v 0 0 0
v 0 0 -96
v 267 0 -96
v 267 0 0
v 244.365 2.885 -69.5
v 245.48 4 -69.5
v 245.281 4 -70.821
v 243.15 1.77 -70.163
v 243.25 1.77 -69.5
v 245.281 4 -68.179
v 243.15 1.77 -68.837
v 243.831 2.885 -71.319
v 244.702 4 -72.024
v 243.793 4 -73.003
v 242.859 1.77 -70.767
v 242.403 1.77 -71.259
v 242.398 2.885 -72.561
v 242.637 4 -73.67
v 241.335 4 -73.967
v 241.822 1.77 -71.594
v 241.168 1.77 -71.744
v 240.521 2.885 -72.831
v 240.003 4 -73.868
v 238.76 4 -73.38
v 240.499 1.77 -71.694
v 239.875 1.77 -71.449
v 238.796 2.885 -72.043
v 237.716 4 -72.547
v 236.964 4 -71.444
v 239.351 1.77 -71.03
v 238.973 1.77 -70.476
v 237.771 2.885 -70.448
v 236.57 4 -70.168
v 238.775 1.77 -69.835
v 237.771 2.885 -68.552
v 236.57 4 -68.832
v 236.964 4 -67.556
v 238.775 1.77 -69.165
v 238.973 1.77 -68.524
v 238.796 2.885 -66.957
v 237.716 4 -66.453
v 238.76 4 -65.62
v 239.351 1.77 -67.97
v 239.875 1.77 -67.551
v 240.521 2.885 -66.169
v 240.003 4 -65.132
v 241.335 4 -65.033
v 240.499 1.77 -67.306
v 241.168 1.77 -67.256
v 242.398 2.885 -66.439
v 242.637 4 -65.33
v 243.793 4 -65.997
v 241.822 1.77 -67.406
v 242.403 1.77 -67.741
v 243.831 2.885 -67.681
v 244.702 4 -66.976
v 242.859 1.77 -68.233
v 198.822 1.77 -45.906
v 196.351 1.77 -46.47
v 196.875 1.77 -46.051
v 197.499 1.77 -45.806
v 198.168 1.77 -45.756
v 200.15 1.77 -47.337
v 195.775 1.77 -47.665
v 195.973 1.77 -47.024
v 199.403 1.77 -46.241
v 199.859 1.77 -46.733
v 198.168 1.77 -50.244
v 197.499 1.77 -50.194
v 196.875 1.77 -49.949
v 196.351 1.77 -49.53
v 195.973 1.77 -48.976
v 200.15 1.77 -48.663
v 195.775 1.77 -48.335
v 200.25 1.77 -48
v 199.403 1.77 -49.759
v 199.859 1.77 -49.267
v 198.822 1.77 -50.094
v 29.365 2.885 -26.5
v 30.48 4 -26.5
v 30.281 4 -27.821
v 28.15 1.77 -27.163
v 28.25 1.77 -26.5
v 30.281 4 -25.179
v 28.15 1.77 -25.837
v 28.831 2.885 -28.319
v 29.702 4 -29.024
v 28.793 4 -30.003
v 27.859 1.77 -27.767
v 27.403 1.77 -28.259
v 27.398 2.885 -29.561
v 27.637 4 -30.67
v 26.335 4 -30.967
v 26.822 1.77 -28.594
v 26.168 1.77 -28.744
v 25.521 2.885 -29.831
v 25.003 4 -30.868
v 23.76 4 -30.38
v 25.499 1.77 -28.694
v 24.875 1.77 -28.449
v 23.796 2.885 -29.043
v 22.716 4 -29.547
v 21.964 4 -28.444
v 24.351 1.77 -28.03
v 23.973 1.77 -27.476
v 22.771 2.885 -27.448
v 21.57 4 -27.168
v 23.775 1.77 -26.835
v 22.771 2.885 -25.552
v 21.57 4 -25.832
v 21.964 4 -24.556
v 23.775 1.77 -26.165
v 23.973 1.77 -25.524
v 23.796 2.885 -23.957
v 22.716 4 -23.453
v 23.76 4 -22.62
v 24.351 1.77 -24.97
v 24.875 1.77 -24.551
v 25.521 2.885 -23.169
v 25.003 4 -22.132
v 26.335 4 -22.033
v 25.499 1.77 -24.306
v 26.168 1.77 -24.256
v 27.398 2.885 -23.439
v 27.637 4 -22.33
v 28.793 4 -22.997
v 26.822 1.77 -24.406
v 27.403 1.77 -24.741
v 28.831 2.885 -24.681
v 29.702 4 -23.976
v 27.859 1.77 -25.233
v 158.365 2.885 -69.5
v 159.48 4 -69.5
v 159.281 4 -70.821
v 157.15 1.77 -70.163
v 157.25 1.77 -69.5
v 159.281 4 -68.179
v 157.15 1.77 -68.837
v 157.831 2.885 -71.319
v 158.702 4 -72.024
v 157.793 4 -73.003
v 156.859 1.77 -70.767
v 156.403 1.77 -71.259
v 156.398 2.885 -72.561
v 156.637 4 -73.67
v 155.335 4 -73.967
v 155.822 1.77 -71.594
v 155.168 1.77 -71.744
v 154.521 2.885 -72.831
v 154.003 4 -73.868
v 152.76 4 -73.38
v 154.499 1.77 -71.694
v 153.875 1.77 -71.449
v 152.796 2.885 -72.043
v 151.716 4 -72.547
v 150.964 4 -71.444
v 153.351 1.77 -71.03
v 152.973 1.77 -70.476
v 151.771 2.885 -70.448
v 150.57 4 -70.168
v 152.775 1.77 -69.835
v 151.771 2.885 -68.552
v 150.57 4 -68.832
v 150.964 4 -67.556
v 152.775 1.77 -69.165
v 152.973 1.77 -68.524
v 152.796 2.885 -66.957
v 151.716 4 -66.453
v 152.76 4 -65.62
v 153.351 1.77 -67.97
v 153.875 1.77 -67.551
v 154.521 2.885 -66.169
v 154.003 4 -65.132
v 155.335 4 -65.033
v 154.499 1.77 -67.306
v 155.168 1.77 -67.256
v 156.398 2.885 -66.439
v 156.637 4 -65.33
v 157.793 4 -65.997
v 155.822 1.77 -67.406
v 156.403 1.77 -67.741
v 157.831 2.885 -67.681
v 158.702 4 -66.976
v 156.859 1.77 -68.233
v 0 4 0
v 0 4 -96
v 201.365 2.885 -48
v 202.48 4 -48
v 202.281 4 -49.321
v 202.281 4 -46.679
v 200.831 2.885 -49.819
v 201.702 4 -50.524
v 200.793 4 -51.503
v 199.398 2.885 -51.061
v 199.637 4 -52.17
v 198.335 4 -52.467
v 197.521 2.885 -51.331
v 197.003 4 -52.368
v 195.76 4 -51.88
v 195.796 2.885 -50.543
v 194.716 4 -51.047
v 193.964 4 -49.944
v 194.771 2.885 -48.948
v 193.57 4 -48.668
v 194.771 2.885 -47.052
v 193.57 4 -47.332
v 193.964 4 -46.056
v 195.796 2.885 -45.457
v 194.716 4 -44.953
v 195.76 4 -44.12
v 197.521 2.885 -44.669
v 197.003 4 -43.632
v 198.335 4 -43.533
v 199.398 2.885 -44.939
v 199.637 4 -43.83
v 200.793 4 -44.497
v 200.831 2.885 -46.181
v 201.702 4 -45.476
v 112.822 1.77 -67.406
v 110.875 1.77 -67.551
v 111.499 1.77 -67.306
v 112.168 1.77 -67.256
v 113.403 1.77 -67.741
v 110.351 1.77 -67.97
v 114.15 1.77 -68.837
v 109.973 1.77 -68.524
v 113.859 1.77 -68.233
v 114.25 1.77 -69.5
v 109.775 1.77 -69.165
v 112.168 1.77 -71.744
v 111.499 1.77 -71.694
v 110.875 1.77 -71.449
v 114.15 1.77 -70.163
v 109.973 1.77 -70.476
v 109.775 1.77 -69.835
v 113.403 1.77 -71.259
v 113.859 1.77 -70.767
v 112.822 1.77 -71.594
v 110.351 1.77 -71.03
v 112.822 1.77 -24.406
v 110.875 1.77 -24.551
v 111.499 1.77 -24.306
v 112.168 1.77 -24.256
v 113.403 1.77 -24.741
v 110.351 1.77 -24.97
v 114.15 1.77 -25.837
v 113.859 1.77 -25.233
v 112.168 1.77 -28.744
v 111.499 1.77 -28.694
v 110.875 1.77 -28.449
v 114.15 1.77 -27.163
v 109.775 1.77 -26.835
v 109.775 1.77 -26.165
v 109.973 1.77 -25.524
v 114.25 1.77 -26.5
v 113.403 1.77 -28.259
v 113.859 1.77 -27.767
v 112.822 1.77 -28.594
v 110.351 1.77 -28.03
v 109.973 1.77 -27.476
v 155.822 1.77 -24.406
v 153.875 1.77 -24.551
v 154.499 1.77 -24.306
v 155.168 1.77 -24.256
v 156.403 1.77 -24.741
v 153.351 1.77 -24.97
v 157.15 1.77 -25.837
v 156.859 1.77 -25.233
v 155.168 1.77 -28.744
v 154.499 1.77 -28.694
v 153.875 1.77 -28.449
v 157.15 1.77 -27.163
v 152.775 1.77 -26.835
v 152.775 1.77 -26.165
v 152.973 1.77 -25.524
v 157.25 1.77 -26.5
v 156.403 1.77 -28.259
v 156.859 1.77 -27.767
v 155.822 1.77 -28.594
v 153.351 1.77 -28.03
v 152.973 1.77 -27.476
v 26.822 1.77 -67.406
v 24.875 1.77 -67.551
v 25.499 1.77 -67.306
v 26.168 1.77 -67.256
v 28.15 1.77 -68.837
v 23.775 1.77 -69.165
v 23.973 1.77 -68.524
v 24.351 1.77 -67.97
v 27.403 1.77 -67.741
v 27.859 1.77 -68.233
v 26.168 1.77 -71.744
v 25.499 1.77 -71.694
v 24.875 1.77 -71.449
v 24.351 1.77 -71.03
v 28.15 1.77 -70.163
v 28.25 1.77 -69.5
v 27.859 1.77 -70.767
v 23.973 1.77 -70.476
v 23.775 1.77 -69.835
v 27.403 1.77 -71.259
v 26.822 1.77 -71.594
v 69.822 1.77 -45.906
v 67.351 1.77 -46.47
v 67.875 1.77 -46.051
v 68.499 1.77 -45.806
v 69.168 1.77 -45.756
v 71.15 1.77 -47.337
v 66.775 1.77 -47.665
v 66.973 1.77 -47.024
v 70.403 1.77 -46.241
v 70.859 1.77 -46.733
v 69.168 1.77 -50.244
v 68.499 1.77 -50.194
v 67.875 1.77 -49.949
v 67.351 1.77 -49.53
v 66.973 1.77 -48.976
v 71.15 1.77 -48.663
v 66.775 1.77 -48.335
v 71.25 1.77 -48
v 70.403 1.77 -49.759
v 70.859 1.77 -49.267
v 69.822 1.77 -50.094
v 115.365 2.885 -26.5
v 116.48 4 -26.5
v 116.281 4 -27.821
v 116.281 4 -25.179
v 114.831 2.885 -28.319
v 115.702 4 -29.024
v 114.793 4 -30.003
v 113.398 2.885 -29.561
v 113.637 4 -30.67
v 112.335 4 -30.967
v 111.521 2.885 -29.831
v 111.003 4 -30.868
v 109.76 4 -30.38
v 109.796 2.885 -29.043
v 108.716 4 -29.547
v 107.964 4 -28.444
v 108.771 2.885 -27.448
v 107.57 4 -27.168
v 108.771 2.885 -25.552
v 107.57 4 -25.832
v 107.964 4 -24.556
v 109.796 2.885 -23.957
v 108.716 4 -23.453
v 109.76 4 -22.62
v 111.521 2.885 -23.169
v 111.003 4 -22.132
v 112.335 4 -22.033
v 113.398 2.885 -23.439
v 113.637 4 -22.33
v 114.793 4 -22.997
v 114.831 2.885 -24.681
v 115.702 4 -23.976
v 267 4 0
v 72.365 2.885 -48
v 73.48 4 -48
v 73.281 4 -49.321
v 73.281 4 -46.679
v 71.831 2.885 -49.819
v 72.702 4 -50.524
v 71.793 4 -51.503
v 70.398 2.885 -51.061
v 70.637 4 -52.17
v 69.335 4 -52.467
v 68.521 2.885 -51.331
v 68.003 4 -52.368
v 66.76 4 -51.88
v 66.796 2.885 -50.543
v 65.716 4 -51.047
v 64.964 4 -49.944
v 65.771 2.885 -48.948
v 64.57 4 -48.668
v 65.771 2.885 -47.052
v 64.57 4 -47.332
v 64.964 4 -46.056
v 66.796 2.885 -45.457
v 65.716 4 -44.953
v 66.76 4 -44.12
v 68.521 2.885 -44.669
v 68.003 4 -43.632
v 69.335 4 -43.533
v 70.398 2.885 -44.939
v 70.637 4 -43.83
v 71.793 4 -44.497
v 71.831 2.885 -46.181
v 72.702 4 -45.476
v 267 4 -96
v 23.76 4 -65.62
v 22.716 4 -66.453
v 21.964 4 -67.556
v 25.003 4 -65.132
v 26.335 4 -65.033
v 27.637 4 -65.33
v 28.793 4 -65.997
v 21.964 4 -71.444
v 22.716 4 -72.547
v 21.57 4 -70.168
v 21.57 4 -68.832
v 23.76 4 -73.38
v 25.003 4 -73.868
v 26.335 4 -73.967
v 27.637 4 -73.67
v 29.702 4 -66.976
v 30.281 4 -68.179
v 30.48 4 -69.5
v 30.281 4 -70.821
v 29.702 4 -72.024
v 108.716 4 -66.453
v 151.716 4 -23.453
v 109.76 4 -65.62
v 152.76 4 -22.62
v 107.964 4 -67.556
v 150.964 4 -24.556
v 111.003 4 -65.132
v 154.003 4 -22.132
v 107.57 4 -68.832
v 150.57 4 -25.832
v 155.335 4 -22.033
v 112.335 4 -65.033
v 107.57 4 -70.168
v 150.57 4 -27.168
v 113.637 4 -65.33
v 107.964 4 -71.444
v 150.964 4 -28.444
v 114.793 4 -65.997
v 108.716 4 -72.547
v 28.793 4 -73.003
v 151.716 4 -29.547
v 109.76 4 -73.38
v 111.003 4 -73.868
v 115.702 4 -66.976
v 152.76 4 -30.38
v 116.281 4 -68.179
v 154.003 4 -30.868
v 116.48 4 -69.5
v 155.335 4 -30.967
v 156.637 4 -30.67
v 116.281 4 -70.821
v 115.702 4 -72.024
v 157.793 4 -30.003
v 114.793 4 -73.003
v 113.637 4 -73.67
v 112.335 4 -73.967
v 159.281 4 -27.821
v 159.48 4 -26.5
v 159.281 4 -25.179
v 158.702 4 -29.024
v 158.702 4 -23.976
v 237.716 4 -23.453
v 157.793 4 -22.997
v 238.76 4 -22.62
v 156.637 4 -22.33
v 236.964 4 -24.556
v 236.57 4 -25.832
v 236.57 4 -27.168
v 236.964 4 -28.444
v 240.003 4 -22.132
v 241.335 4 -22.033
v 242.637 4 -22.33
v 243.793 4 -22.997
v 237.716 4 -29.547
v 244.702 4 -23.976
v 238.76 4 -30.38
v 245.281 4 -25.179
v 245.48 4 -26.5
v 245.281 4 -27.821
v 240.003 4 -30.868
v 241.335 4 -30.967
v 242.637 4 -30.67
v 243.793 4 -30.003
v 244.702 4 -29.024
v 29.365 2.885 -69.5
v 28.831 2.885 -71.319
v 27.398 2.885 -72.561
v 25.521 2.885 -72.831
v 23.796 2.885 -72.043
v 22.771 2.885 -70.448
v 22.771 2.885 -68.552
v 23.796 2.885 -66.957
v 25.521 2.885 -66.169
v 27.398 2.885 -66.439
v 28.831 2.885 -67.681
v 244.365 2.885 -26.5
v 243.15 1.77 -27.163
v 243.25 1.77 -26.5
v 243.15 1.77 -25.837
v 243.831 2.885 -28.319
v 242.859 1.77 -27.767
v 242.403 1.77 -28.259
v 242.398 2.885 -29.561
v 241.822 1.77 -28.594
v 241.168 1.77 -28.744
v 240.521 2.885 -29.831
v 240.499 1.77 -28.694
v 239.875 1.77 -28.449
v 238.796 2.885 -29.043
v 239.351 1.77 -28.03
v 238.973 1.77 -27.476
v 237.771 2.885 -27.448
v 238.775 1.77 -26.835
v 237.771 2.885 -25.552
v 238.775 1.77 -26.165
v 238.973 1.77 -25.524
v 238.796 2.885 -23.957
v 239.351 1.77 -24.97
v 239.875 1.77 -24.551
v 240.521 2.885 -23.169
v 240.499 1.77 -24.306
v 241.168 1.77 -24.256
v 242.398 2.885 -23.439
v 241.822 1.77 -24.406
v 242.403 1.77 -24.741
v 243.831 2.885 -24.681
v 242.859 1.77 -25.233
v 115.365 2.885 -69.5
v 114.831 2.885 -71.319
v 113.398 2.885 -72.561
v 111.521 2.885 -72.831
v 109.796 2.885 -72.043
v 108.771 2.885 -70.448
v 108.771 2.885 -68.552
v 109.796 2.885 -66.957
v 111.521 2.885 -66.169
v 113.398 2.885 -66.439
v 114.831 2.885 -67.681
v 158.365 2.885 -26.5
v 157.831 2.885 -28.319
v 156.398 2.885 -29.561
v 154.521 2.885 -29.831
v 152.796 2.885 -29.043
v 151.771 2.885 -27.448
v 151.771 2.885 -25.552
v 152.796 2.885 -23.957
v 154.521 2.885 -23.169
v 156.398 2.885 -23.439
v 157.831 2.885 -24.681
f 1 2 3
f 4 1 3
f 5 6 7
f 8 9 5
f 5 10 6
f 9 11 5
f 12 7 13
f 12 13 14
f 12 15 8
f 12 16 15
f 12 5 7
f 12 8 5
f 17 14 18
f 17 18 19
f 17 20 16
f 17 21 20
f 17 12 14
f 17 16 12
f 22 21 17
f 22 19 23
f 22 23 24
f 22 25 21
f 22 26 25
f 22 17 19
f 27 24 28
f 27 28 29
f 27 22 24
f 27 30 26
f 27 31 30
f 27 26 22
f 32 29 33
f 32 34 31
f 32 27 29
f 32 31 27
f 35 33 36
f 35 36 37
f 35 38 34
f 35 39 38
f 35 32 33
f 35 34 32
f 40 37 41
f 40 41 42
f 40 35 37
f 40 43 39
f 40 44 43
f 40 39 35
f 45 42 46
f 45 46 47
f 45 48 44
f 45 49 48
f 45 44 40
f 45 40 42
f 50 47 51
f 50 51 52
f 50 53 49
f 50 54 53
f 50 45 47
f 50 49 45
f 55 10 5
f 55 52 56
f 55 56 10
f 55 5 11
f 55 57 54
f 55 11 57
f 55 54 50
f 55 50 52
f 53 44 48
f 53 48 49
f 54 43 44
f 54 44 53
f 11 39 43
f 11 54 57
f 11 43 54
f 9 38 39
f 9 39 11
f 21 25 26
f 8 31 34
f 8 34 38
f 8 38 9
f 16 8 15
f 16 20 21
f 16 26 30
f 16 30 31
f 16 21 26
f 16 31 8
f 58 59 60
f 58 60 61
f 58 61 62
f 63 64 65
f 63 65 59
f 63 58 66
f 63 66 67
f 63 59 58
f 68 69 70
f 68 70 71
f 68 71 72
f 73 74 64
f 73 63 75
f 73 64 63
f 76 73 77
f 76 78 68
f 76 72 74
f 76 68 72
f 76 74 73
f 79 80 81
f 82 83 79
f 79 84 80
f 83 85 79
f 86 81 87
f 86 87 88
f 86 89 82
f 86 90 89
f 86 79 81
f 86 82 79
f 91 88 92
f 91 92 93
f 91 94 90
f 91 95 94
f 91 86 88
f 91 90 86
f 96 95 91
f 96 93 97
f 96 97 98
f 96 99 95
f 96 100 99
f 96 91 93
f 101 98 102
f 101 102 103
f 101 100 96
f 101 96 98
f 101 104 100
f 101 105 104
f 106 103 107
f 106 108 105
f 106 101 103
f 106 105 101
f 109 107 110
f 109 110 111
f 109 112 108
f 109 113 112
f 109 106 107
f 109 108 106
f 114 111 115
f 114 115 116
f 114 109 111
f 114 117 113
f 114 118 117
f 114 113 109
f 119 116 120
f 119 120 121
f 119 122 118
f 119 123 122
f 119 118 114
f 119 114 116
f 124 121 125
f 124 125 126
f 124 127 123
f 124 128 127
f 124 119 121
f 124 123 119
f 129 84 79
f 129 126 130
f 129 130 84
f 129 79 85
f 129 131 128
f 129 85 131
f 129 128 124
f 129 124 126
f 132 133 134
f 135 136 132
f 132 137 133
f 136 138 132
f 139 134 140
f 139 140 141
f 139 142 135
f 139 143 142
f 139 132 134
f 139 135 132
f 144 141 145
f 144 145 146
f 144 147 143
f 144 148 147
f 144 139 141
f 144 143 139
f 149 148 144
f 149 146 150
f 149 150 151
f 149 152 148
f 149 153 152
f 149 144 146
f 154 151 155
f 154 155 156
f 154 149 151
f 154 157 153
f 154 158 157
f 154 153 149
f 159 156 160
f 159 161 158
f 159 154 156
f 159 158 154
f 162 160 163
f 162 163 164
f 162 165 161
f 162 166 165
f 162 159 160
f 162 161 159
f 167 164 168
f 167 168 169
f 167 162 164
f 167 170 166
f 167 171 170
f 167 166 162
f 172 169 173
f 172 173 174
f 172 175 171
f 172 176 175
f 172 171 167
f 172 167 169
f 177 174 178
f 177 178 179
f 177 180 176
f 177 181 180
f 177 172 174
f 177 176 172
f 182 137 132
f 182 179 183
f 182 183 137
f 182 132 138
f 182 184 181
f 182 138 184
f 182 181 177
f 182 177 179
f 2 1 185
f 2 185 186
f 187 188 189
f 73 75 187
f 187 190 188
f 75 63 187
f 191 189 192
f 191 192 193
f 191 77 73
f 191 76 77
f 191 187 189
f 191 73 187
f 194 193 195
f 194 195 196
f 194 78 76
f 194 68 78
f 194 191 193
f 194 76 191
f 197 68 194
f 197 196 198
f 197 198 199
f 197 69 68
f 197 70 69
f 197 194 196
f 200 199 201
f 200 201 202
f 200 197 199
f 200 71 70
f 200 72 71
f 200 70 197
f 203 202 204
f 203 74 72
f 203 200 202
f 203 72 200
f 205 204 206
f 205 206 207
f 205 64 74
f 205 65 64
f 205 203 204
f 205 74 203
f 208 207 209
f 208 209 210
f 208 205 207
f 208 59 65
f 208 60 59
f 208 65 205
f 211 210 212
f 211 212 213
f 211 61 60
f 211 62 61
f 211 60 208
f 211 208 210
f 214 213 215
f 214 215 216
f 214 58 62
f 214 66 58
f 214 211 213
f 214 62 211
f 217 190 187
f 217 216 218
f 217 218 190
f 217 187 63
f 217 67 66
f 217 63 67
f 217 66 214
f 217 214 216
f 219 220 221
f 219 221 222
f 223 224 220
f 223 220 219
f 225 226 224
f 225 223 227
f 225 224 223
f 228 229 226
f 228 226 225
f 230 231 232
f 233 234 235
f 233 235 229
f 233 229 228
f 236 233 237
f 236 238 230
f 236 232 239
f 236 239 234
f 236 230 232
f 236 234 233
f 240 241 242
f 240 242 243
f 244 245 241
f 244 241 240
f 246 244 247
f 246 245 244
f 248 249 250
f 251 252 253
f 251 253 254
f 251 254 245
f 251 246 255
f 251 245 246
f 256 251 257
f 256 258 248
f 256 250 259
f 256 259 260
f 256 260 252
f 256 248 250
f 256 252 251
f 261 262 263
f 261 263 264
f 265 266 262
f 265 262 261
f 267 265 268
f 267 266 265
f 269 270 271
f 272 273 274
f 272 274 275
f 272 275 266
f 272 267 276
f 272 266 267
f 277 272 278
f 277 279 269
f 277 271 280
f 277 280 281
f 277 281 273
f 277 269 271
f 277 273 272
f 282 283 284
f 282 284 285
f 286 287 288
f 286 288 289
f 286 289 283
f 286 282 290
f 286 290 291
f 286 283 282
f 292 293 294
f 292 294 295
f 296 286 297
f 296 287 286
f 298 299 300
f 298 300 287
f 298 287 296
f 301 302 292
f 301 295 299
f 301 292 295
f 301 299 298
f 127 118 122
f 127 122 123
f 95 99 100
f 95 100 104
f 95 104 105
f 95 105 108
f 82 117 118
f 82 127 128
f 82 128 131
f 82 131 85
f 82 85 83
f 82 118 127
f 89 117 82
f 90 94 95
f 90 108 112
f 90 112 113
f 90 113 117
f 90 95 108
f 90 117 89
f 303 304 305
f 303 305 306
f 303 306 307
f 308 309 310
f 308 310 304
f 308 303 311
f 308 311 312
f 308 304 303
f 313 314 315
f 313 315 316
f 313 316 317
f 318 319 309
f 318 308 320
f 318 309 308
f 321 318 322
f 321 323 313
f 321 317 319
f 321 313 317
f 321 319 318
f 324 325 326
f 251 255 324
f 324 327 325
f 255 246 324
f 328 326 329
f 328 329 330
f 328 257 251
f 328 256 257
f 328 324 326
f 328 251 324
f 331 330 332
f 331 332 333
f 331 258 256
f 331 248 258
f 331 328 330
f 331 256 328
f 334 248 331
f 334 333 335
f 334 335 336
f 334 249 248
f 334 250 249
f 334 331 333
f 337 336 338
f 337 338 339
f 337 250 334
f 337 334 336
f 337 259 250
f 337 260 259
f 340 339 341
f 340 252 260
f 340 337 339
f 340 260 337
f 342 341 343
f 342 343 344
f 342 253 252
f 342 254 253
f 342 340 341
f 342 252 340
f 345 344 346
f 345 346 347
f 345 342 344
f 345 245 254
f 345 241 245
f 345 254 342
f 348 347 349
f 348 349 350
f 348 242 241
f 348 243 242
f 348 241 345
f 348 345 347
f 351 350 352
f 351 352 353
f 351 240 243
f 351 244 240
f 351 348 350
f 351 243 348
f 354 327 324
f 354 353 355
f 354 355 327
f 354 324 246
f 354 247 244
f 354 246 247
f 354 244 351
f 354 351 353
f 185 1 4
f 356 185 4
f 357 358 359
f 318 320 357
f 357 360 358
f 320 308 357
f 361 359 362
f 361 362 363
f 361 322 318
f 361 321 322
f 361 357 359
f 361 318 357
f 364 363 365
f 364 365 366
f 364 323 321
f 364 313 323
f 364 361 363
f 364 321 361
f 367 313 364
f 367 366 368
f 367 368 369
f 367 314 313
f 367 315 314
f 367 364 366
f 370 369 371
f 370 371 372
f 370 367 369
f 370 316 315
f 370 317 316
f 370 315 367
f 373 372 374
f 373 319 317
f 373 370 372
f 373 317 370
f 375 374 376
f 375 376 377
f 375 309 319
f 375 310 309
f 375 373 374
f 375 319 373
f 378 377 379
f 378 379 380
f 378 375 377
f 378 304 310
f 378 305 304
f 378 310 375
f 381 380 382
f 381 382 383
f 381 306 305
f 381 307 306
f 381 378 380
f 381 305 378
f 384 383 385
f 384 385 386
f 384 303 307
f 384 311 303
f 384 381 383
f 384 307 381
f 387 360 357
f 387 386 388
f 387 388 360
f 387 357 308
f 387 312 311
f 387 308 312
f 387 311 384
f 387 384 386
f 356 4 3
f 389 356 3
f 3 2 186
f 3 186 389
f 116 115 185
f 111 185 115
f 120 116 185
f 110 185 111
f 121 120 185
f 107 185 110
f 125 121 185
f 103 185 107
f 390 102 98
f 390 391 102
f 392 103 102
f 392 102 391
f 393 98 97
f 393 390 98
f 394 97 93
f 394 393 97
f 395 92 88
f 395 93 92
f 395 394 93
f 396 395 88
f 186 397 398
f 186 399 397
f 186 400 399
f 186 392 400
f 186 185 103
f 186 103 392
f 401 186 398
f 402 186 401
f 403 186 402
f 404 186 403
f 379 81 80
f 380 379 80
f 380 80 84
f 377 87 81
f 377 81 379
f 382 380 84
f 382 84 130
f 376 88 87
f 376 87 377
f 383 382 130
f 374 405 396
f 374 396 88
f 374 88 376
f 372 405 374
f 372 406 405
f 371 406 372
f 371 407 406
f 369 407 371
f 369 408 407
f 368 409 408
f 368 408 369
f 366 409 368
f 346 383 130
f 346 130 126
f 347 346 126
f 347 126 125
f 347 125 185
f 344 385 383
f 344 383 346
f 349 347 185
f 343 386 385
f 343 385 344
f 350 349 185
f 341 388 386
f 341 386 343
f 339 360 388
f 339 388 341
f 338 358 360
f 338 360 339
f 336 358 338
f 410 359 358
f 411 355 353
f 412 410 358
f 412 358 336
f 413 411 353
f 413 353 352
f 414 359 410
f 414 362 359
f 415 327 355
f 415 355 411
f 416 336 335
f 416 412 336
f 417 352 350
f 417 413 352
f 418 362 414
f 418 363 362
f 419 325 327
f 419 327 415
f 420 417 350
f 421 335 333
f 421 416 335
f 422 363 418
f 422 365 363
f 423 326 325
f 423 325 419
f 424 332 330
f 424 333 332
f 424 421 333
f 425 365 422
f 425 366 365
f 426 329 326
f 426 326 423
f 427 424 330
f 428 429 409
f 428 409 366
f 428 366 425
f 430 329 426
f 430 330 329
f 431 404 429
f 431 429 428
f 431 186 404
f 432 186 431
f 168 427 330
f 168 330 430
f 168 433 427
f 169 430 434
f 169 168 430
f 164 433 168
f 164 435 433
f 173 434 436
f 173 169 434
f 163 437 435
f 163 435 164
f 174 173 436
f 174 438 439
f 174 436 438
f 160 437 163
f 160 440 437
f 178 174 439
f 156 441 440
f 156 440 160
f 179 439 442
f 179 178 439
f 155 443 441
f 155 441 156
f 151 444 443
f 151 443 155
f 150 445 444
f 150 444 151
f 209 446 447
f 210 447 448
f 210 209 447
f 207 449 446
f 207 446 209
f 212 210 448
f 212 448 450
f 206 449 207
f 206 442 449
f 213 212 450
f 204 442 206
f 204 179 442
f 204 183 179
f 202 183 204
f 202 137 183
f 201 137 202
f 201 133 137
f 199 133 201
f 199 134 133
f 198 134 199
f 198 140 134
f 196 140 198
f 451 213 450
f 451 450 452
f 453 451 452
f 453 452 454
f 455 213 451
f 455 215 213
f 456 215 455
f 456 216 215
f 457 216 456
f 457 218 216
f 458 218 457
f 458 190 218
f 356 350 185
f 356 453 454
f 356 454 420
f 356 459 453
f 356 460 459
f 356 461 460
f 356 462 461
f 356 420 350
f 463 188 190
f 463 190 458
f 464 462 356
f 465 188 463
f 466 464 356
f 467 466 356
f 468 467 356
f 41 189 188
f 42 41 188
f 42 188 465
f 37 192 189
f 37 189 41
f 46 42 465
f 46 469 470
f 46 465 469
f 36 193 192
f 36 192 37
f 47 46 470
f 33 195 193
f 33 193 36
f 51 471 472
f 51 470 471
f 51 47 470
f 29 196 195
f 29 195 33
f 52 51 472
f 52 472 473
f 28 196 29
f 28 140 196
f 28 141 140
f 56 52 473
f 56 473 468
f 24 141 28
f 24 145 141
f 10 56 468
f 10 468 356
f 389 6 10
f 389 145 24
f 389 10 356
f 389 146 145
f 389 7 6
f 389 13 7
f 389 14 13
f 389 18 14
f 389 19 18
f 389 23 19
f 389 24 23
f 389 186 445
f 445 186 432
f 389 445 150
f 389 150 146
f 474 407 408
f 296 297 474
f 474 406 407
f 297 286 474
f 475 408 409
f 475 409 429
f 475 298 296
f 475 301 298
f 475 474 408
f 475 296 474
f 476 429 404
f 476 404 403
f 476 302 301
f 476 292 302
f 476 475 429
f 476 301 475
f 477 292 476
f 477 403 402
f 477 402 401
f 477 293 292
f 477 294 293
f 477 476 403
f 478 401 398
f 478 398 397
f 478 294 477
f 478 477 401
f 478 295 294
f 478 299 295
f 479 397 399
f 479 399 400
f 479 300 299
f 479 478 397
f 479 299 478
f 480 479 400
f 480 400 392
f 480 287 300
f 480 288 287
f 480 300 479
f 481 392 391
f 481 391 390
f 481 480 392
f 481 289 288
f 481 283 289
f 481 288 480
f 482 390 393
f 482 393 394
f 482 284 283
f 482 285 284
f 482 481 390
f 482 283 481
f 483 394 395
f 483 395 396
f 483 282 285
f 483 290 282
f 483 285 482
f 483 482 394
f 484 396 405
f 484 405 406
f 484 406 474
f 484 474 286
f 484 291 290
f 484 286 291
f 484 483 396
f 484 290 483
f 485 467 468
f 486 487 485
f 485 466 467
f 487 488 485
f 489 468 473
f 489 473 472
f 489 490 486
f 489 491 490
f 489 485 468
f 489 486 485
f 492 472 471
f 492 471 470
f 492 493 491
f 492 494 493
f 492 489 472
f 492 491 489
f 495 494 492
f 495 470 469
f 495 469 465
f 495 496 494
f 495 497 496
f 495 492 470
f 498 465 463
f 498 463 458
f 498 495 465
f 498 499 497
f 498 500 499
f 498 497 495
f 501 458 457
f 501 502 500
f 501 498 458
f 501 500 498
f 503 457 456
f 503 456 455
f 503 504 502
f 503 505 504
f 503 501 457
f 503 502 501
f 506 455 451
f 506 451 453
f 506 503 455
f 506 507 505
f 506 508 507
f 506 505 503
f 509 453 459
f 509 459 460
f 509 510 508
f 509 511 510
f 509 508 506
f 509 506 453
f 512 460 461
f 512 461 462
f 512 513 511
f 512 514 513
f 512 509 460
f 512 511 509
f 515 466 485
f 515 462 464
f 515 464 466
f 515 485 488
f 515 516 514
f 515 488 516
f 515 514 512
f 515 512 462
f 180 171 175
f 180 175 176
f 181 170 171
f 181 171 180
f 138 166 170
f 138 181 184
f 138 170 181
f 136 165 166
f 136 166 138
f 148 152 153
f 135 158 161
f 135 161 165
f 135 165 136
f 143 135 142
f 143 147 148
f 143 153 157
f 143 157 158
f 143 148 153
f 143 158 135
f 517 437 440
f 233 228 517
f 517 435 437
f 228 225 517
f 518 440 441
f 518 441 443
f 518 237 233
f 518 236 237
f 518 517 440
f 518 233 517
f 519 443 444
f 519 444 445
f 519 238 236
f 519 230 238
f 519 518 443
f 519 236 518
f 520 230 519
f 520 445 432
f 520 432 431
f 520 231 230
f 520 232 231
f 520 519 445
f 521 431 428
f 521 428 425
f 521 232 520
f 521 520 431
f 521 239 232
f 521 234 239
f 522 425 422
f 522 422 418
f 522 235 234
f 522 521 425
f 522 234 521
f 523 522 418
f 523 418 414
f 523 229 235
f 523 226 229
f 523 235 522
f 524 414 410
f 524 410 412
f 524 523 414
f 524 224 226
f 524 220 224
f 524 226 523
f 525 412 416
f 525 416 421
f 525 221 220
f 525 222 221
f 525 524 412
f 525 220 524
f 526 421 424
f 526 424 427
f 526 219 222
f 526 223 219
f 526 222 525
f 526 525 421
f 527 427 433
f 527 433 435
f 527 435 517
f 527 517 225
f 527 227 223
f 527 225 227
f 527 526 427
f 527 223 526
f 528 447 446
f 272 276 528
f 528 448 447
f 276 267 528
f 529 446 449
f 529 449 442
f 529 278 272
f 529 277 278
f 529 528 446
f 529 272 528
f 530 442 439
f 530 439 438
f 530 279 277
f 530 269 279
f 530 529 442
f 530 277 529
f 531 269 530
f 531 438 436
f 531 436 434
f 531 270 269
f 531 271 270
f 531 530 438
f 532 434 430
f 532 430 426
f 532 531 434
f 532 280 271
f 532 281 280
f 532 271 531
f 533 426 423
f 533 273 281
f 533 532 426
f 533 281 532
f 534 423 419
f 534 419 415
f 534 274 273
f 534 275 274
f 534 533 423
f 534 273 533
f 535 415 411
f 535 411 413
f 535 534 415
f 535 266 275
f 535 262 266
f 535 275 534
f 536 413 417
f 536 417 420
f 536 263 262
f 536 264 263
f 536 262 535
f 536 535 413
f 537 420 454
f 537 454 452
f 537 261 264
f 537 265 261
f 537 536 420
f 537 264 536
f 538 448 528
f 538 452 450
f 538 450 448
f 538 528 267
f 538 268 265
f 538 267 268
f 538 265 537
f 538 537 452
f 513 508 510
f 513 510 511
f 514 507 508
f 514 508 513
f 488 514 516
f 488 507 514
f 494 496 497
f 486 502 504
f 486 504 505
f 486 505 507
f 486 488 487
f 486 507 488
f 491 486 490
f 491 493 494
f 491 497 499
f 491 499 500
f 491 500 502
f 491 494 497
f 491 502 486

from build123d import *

# Parameters (mm, degrees)
SKETCH1_W                  = 267
SKETCH1_H                  = 96
BOSS_EXTRUDE1_DEPTH        = 4
ADVANCEDHOLE2_OUTLINE_R    = 2.25
ADVANCEDHOLE2_DEPTH        = 2.23
ADVANCEDHOLE2_DRAFT        = -45
ADVANCEDHOLE2_2_OUTLINE_R  = 2.25
ADVANCEDHOLE2_2_DEPTH      = 2.23
ADVANCEDHOLE2_2_DRAFT      = -45
ADVANCEDHOLE2_3_OUTLINE_R  = 2.25
ADVANCEDHOLE2_3_DEPTH      = 2.23
ADVANCEDHOLE2_3_DRAFT      = -45
ADVANCEDHOLE2_4_OUTLINE_R  = 2.25
ADVANCEDHOLE2_4_DEPTH      = 2.23
ADVANCEDHOLE2_4_DRAFT      = -45
ADVANCEDHOLE2_5_OUTLINE_R  = 2.25
ADVANCEDHOLE2_5_DEPTH      = 2.23
ADVANCEDHOLE2_5_DRAFT      = -45
ADVANCEDHOLE2_6_OUTLINE_R  = 2.25
ADVANCEDHOLE2_6_DEPTH      = 2.23
ADVANCEDHOLE2_6_DRAFT      = -45
ADVANCEDHOLE2_7_OUTLINE_R  = 2.25
ADVANCEDHOLE2_7_DEPTH      = 2.23
ADVANCEDHOLE2_7_DRAFT      = -45
ADVANCEDHOLE2_8_OUTLINE_R  = 2.25
ADVANCEDHOLE2_8_DEPTH      = 2.23
ADVANCEDHOLE2_8_DRAFT      = -45
ADVANCEDHOLE2_9_OUTLINE_R  = 2.25
ADVANCEDHOLE2_9_DEPTH      = 2.23
ADVANCEDHOLE2_9_DRAFT      = -45
ADVANCEDHOLE2_10_OUTLINE_R = 2.25
ADVANCEDHOLE2_10_DEPTH     = 2.23
ADVANCEDHOLE2_10_DRAFT     = -45


# Read off the part's stored shape, not the designer's step: AdvancedHole2
with BuildPart() as part:
    # Sketch1 → Boss-Extrude1 (new body)
    with BuildSketch(Plane(origin=(0, 0, 0), x_dir=(1, 0, 0), z_dir=(0, 1, 0))):
        with Locations((133.5, 48)):
            Rectangle(SKETCH1_W, SKETCH1_H)
    extrude(amount=BOSS_EXTRUDE1_DEPTH)


with BuildPart() as advancedhole2_tool:
    # AdvancedHole2 outline → AdvancedHole2 (with draft: the straight prism first)
    with BuildSketch(Plane(origin=(0, 1.77, 0), x_dir=(1, 0, 0), z_dir=(0, 1, 0))):
        with Locations((241, 26.5)):
            Circle(ADVANCEDHOLE2_OUTLINE_R)
    extrude(amount=ADVANCEDHOLE2_DEPTH)
    # AdvancedHole2: the draft: its side faces are tilted about the plane it starts from
    advancedhole2_sides = [advancedhole2_tool.faces().sort_by_distance(p)[0] for p in [
        (238.75, 2.885, -26.5),
    ]]
    draft(advancedhole2_sides, Plane(origin=(0, 1.77, 0), x_dir=(1, 0, 0), z_dir=(0, 1, 0)), ADVANCEDHOLE2_DRAFT)


with BuildPart() as part_1:
    add(part.part)

    # AdvancedHole2: cut by advancedhole2_tool
    add(advancedhole2_tool.part, mode=Mode.SUBTRACT)


with BuildPart() as advancedhole2_2_tool:
    # AdvancedHole2 2 outline → AdvancedHole2 2 (with draft: the straight prism first)
    with BuildSketch(Plane(origin=(0, 1.77, 0), x_dir=(1, 0, 0), z_dir=(0, 1, 0))):
        with Locations((198, 48)):
            Circle(ADVANCEDHOLE2_2_OUTLINE_R)
    extrude(amount=ADVANCEDHOLE2_2_DEPTH)
    # AdvancedHole2 2: the draft: its side faces are tilted about the plane it starts from
    advancedhole2_2_sides = [advancedhole2_2_tool.faces().sort_by_distance(p)[0] for p in [
        (195.75, 2.885, -48),
    ]]
    draft(advancedhole2_2_sides, Plane(origin=(0, 1.77, 0), x_dir=(1, 0, 0), z_dir=(0, 1, 0)), ADVANCEDHOLE2_2_DRAFT)


with BuildPart() as part_2:
    add(part_1.part)

    # AdvancedHole2 2: cut by advancedhole2_2_tool
    add(advancedhole2_2_tool.part, mode=Mode.SUBTRACT)


with BuildPart() as advancedhole2_3_tool:
    # AdvancedHole2 3 outline → AdvancedHole2 3 (with draft: the straight prism first)
    with BuildSketch(Plane(origin=(0, 1.77, 0), x_dir=(1, 0, 0), z_dir=(0, 1, 0))):
        with Locations((241, 69.5)):
            Circle(ADVANCEDHOLE2_3_OUTLINE_R)
    extrude(amount=ADVANCEDHOLE2_3_DEPTH)
    # AdvancedHole2 3: the draft: its side faces are tilted about the plane it starts from
    advancedhole2_3_sides = [advancedhole2_3_tool.faces().sort_by_distance(p)[0] for p in [
        (238.75, 2.885, -69.5),
    ]]
    draft(advancedhole2_3_sides, Plane(origin=(0, 1.77, 0), x_dir=(1, 0, 0), z_dir=(0, 1, 0)), ADVANCEDHOLE2_3_DRAFT)


with BuildPart() as part_3:
    add(part_2.part)

    # AdvancedHole2 3: cut by advancedhole2_3_tool
    add(advancedhole2_3_tool.part, mode=Mode.SUBTRACT)


with BuildPart() as advancedhole2_4_tool:
    # AdvancedHole2 4 outline → AdvancedHole2 4 (with draft: the straight prism first)
    with BuildSketch(Plane(origin=(0, 1.77, 0), x_dir=(1, 0, 0), z_dir=(0, 1, 0))):
        with Locations((155, 69.5)):
            Circle(ADVANCEDHOLE2_4_OUTLINE_R)
    extrude(amount=ADVANCEDHOLE2_4_DEPTH)
    # AdvancedHole2 4: the draft: its side faces are tilted about the plane it starts from
    advancedhole2_4_sides = [advancedhole2_4_tool.faces().sort_by_distance(p)[0] for p in [
        (152.75, 2.885, -69.5),
    ]]
    draft(advancedhole2_4_sides, Plane(origin=(0, 1.77, 0), x_dir=(1, 0, 0), z_dir=(0, 1, 0)), ADVANCEDHOLE2_4_DRAFT)


with BuildPart() as part_4:
    add(part_3.part)

    # AdvancedHole2 4: cut by advancedhole2_4_tool
    add(advancedhole2_4_tool.part, mode=Mode.SUBTRACT)


with BuildPart() as advancedhole2_5_tool:
    # AdvancedHole2 5 outline → AdvancedHole2 5 (with draft: the straight prism first)
    with BuildSketch(Plane(origin=(0, 1.77, 0), x_dir=(1, 0, 0), z_dir=(0, 1, 0))):
        with Locations((155, 26.5)):
            Circle(ADVANCEDHOLE2_5_OUTLINE_R)
    extrude(amount=ADVANCEDHOLE2_5_DEPTH)
    # AdvancedHole2 5: the draft: its side faces are tilted about the plane it starts from
    advancedhole2_5_sides = [advancedhole2_5_tool.faces().sort_by_distance(p)[0] for p in [
        (152.75, 2.885, -26.5),
    ]]
    draft(advancedhole2_5_sides, Plane(origin=(0, 1.77, 0), x_dir=(1, 0, 0), z_dir=(0, 1, 0)), ADVANCEDHOLE2_5_DRAFT)


with BuildPart() as part_5:
    add(part_4.part)

    # AdvancedHole2 5: cut by advancedhole2_5_tool
    add(advancedhole2_5_tool.part, mode=Mode.SUBTRACT)


with BuildPart() as advancedhole2_6_tool:
    # AdvancedHole2 6 outline → AdvancedHole2 6 (with draft: the straight prism first)
    with BuildSketch(Plane(origin=(0, 1.77, 0), x_dir=(1, 0, 0), z_dir=(0, 1, 0))):
        with Locations((112, 26.5)):
            Circle(ADVANCEDHOLE2_6_OUTLINE_R)
    extrude(amount=ADVANCEDHOLE2_6_DEPTH)
    # AdvancedHole2 6: the draft: its side faces are tilted about the plane it starts from
    advancedhole2_6_sides = [advancedhole2_6_tool.faces().sort_by_distance(p)[0] for p in [
        (109.75, 2.885, -26.5),
    ]]
    draft(advancedhole2_6_sides, Plane(origin=(0, 1.77, 0), x_dir=(1, 0, 0), z_dir=(0, 1, 0)), ADVANCEDHOLE2_6_DRAFT)


with BuildPart() as part_6:
    add(part_5.part)

    # AdvancedHole2 6: cut by advancedhole2_6_tool
    add(advancedhole2_6_tool.part, mode=Mode.SUBTRACT)


with BuildPart() as advancedhole2_7_tool:
    # AdvancedHole2 7 outline → AdvancedHole2 7 (with draft: the straight prism first)
    with BuildSketch(Plane(origin=(0, 1.77, 0), x_dir=(1, 0, 0), z_dir=(0, 1, 0))):
        with Locations((112, 69.5)):
            Circle(ADVANCEDHOLE2_7_OUTLINE_R)
    extrude(amount=ADVANCEDHOLE2_7_DEPTH)
    # AdvancedHole2 7: the draft: its side faces are tilted about the plane it starts from
    advancedhole2_7_sides = [advancedhole2_7_tool.faces().sort_by_distance(p)[0] for p in [
        (109.75, 2.885, -69.5),
    ]]
    draft(advancedhole2_7_sides, Plane(origin=(0, 1.77, 0), x_dir=(1, 0, 0), z_dir=(0, 1, 0)), ADVANCEDHOLE2_7_DRAFT)


with BuildPart() as part_7:
    add(part_6.part)

    # AdvancedHole2 7: cut by advancedhole2_7_tool
    add(advancedhole2_7_tool.part, mode=Mode.SUBTRACT)


with BuildPart() as advancedhole2_8_tool:
    # AdvancedHole2 8 outline → AdvancedHole2 8 (with draft: the straight prism first)
    with BuildSketch(Plane(origin=(0, 1.77, 0), x_dir=(1, 0, 0), z_dir=(0, 1, 0))):
        with Locations((69, 48)):
            Circle(ADVANCEDHOLE2_8_OUTLINE_R)
    extrude(amount=ADVANCEDHOLE2_8_DEPTH)
    # AdvancedHole2 8: the draft: its side faces are tilted about the plane it starts from
    advancedhole2_8_sides = [advancedhole2_8_tool.faces().sort_by_distance(p)[0] for p in [
        (66.75, 2.885, -48),
    ]]
    draft(advancedhole2_8_sides, Plane(origin=(0, 1.77, 0), x_dir=(1, 0, 0), z_dir=(0, 1, 0)), ADVANCEDHOLE2_8_DRAFT)


with BuildPart() as part_8:
    add(part_7.part)

    # AdvancedHole2 8: cut by advancedhole2_8_tool
    add(advancedhole2_8_tool.part, mode=Mode.SUBTRACT)


with BuildPart() as advancedhole2_9_tool:
    # AdvancedHole2 9 outline → AdvancedHole2 9 (with draft: the straight prism first)
    with BuildSketch(Plane(origin=(0, 1.77, 0), x_dir=(1, 0, 0), z_dir=(0, 1, 0))):
        with Locations((26, 26.5)):
            Circle(ADVANCEDHOLE2_9_OUTLINE_R)
    extrude(amount=ADVANCEDHOLE2_9_DEPTH)
    # AdvancedHole2 9: the draft: its side faces are tilted about the plane it starts from
    advancedhole2_9_sides = [advancedhole2_9_tool.faces().sort_by_distance(p)[0] for p in [
        (23.75, 2.885, -26.5),
    ]]
    draft(advancedhole2_9_sides, Plane(origin=(0, 1.77, 0), x_dir=(1, 0, 0), z_dir=(0, 1, 0)), ADVANCEDHOLE2_9_DRAFT)


with BuildPart() as part_9:
    add(part_8.part)

    # AdvancedHole2 9: cut by advancedhole2_9_tool
    add(advancedhole2_9_tool.part, mode=Mode.SUBTRACT)


with BuildPart() as advancedhole2_10_tool:
    # AdvancedHole2 10 outline → AdvancedHole2 10 (with draft: the straight prism first)
    with BuildSketch(Plane(origin=(0, 1.77, 0), x_dir=(1, 0, 0), z_dir=(0, 1, 0))):
        with Locations((26, 69.5)):
            Circle(ADVANCEDHOLE2_10_OUTLINE_R)
    extrude(amount=ADVANCEDHOLE2_10_DEPTH)
    # AdvancedHole2 10: the draft: its side faces are tilted about the plane it starts from
    advancedhole2_10_sides = [advancedhole2_10_tool.faces().sort_by_distance(p)[0] for p in [
        (23.75, 2.885, -69.5),
    ]]
    draft(advancedhole2_10_sides, Plane(origin=(0, 1.77, 0), x_dir=(1, 0, 0), z_dir=(0, 1, 0)), ADVANCEDHOLE2_10_DRAFT)


with BuildPart() as part_10:
    add(part_9.part)

    # AdvancedHole2 10: cut by advancedhole2_10_tool
    add(advancedhole2_10_tool.part, mode=Mode.SUBTRACT)


solid = part_10.part
